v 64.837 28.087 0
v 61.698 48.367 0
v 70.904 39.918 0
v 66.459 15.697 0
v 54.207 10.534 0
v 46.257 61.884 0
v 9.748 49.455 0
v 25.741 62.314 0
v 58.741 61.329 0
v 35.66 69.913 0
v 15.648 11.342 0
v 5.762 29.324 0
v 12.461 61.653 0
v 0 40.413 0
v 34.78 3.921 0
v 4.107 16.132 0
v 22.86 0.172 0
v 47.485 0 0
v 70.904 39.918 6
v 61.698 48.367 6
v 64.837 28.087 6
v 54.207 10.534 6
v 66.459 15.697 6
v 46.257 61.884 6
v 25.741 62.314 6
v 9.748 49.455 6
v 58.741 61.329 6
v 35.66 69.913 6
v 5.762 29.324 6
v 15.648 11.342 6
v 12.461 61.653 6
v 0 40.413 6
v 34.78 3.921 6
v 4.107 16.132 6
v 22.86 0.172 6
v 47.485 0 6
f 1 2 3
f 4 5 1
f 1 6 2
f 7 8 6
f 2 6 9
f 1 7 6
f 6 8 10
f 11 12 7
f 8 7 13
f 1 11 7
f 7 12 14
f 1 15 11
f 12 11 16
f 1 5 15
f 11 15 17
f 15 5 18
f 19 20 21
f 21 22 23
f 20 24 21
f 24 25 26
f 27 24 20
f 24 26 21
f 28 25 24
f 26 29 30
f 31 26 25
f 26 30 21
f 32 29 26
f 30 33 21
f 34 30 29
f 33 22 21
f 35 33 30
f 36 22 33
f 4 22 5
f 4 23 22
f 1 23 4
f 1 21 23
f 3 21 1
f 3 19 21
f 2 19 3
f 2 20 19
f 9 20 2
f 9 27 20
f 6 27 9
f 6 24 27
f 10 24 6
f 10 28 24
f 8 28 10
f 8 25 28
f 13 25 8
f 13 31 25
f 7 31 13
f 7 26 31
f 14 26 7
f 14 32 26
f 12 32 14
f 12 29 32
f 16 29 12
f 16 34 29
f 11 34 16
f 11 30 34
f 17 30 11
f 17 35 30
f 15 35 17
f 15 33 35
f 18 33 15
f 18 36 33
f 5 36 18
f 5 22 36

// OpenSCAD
$fn = 32;

// ----------------------------------------------------------------------
// Chain sprocket: 9 teeth, 30 mm root radius
// ----------------------------------------------------------------------

// --- parameters (mm) ---
profile_height = 6;       // extrusion height
profile_points = 18;      // points of the closed outline

profile = [[64.837, 28.087], [70.904, 39.918], [61.698, 48.367], [58.741, 61.329], [46.257, 61.884], [35.66, 69.913], [25.741, 62.314], [12.461, 61.653], [9.748, 49.455], [0, 40.413], [5.762, 29.324], [4.107, 16.132], [15.648, 11.342], [22.86, 0.172], [34.78, 3.921], [47.485, 0], [54.207, 10.534], [66.459, 15.697]];  // single closed polygon, 18 points, counter clockwise

// --- the one profile operation ---
linear_extrude(height = profile_height) polygon(points = profile);
